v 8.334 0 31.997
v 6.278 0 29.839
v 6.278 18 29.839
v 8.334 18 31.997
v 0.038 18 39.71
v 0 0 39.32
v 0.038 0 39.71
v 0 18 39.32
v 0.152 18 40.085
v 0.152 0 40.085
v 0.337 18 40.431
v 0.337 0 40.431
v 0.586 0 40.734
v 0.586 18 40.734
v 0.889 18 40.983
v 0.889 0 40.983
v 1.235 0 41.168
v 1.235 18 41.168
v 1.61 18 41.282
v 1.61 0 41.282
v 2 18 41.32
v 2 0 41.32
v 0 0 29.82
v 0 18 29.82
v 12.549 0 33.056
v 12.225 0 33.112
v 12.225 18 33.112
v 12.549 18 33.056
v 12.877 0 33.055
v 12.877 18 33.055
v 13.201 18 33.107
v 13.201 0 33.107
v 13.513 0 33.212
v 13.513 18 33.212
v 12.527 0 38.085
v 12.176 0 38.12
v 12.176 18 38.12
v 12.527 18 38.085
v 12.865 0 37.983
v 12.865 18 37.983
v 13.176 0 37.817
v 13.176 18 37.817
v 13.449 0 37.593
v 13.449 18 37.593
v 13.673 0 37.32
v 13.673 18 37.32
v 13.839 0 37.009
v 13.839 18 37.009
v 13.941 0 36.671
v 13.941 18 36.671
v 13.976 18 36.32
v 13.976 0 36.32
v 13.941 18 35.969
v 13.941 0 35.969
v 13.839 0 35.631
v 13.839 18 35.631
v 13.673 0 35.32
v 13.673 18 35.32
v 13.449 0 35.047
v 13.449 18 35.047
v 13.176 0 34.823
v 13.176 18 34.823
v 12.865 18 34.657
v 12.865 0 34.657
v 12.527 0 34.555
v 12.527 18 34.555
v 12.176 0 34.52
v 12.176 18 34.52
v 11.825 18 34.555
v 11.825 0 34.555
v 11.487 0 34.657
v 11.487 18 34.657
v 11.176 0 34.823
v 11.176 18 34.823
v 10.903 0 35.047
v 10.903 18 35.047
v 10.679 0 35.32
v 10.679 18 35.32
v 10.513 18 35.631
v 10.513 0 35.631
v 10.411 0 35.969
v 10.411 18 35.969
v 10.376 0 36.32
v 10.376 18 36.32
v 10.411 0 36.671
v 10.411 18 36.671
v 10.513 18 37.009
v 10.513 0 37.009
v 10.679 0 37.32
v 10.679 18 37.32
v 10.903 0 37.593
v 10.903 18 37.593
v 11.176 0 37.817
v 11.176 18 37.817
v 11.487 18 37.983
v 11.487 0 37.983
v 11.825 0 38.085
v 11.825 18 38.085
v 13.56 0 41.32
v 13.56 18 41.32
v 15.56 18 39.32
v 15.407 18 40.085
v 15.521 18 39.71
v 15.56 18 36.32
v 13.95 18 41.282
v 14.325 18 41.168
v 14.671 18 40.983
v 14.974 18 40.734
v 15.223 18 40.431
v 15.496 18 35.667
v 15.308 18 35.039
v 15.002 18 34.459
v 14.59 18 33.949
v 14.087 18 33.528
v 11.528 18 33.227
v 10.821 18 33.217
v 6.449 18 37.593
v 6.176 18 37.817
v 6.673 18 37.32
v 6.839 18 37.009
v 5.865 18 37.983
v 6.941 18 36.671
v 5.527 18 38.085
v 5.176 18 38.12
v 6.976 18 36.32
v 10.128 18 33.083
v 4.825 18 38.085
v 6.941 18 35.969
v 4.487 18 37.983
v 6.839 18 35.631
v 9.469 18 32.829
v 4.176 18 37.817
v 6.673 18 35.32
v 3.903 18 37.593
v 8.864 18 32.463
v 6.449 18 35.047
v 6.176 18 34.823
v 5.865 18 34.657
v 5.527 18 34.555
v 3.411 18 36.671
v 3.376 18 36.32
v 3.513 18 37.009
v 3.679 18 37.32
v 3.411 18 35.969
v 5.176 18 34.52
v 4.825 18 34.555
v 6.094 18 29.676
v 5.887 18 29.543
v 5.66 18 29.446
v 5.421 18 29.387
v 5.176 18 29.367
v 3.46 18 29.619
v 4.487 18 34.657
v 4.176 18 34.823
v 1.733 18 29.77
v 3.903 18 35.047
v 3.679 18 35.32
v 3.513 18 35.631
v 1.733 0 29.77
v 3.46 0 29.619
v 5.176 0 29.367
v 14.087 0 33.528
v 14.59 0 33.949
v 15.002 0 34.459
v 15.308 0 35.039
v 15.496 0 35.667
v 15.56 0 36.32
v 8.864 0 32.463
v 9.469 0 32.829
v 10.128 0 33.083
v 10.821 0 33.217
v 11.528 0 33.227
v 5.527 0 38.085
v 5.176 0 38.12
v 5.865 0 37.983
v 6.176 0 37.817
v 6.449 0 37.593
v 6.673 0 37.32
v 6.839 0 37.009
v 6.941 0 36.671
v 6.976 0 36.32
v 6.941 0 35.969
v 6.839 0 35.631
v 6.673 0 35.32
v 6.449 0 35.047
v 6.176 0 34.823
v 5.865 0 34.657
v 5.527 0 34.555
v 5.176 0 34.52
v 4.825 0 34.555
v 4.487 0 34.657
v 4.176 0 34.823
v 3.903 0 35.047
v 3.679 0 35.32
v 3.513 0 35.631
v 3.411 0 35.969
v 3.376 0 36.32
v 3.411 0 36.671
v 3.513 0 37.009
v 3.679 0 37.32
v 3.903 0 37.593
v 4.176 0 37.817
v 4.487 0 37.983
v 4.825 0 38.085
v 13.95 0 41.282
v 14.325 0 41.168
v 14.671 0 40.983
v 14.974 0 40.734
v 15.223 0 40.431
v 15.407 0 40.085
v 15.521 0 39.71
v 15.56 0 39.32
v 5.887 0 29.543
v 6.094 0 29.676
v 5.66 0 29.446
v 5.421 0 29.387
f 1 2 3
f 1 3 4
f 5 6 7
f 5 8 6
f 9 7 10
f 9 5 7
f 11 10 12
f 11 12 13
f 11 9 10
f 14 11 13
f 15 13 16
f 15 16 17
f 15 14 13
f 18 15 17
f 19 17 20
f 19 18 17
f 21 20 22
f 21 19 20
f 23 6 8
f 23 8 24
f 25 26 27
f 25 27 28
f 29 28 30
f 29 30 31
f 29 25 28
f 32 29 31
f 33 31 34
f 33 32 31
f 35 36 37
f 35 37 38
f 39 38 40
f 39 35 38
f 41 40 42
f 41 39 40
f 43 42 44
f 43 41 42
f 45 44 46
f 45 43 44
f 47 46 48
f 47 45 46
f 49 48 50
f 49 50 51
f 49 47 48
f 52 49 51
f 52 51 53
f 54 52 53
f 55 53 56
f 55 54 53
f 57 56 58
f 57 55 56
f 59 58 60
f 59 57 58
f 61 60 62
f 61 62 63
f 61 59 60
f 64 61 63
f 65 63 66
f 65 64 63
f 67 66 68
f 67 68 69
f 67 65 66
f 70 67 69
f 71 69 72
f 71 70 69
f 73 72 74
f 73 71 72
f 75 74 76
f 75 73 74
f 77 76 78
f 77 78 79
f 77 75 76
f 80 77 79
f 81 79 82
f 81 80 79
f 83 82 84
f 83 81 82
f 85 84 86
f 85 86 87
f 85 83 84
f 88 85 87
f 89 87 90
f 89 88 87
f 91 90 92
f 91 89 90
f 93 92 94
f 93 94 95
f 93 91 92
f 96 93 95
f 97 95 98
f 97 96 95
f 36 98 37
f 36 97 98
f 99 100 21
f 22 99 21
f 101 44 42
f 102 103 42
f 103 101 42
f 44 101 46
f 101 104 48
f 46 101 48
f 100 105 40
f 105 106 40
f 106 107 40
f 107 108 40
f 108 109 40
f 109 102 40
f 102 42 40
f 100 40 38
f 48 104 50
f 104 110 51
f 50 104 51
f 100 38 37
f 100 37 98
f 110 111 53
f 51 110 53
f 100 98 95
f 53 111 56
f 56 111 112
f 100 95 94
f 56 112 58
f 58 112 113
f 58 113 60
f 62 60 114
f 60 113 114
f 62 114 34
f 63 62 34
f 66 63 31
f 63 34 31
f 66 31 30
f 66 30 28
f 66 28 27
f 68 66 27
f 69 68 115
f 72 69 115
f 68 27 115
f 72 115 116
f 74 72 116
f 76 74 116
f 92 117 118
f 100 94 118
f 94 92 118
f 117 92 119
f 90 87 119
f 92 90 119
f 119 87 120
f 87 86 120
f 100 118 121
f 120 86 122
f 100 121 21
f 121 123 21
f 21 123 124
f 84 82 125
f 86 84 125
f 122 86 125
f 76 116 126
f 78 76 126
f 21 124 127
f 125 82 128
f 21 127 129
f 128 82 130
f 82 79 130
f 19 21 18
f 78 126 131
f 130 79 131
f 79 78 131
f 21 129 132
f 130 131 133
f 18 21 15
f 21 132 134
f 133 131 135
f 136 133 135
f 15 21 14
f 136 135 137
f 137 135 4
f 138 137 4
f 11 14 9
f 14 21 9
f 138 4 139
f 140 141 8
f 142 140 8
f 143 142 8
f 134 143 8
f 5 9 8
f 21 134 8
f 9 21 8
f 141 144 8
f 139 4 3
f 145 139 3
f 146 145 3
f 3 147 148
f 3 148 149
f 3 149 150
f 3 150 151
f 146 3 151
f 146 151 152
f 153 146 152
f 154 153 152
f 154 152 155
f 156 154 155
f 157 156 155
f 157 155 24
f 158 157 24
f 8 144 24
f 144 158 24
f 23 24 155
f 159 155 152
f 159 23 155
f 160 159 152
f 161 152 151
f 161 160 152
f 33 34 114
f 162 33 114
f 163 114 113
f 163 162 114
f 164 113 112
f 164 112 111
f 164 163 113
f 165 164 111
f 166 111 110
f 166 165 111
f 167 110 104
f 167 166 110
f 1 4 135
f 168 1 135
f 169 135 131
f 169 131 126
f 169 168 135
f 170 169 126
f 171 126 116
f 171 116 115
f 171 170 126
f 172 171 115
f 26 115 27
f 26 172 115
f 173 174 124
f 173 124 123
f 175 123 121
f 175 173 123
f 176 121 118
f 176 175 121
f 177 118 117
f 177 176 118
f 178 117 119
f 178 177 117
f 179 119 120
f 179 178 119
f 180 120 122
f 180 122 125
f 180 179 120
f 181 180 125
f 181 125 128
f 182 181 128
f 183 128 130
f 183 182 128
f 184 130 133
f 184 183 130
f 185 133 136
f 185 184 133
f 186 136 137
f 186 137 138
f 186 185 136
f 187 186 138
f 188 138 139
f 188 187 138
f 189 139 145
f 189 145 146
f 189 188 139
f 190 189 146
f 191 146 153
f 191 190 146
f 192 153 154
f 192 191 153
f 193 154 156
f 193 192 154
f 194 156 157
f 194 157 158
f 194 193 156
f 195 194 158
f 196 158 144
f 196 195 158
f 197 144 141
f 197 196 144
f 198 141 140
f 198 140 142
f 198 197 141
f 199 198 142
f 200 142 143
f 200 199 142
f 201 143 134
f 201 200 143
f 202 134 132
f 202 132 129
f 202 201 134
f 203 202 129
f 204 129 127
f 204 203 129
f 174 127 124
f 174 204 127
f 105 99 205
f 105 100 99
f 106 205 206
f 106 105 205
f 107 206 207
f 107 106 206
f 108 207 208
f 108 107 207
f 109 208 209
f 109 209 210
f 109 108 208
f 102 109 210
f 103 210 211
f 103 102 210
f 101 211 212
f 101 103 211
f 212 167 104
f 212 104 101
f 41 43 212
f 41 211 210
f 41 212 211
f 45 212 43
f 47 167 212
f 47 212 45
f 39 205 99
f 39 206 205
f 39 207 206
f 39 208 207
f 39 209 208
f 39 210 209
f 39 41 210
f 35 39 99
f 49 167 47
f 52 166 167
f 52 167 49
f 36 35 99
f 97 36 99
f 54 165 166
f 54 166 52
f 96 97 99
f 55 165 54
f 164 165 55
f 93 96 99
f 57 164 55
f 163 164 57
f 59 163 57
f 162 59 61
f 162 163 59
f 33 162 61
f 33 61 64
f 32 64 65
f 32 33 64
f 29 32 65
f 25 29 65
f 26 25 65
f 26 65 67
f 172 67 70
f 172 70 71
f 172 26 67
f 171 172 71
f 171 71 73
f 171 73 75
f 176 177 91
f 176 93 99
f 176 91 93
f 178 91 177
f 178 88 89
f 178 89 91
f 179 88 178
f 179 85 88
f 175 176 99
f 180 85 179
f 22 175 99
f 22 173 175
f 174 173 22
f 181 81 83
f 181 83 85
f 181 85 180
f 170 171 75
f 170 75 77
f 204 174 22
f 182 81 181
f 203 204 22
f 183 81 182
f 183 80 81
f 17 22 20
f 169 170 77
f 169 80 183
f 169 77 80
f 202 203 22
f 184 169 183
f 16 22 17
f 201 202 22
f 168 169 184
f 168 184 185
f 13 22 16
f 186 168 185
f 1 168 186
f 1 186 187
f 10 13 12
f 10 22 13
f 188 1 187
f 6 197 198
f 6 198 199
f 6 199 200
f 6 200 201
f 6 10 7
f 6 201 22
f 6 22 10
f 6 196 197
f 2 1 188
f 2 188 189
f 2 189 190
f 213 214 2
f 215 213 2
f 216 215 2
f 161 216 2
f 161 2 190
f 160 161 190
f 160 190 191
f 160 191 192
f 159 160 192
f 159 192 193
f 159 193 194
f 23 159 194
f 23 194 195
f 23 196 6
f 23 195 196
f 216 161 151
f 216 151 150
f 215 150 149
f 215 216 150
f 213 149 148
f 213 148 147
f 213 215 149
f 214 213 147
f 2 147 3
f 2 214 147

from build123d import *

# Parameters (mm, degrees)
SKETCH_1_R      = 1.8
EXTRUDE_1_DEPTH = 18
FILLET_1_R      = 2


with BuildPart() as part:
    # 草图1 → 凸台-拉伸1 (new body)
    with BuildSketch(Plane(origin=(0, 0, 0), x_dir=(1, 0, 0), z_dir=(0, 1, 0))):
        with BuildLine():
            Line((0, -41.32), (0, -31.32))
            Line((0, -31.32), (0, -29.82))
            ThreePointArc((0, -29.82), (2.597888216, -29.706621767), (5.176021638, -29.367349216))
            ThreePointArc((5.176021638, -29.367349216), (5.775398606, -29.490339394), (6.277905634, -29.839432535))
            Line((6.277905634, -29.839432535), (8.333639143, -31.996940996))
            ThreePointArc((8.333639143, -31.996940996), (10.127846327, -33.082932859), (12.22492131, -33.111816408))
            ThreePointArc((12.22492131, -33.111816408), (12.877077837, -33.05487755), (13.512685008, -33.211573734))
            ThreePointArc((13.512685008, -33.211573734), (15.001951856, -34.459059049), (15.559656196, -36.32))
            Line((15.559656196, -36.32), (15.559656196, -41.32))
            Line((15.559656196, -41.32), (0, -41.32))
        make_face()
        with Locations(Location((5.176021638, -36.32, 0), (0, 0, 270))):
            Circle(SKETCH_1_R, mode=Mode.SUBTRACT)
        with Locations(Location((12.176021638, -36.32, 0), (0, 0, 270))):
            Circle(SKETCH_1_R, mode=Mode.SUBTRACT)
    extrude(amount=EXTRUDE_1_DEPTH)

    # 圆角1
    fillet_1_edges = [part.edges().sort_by_distance(p)[0] for p in [
        (15.559656196, 9, 41.32),
        (0, 9, 41.32),
    ]]
    fillet(fillet_1_edges, radius=FILLET_1_R)


solid = part.part
